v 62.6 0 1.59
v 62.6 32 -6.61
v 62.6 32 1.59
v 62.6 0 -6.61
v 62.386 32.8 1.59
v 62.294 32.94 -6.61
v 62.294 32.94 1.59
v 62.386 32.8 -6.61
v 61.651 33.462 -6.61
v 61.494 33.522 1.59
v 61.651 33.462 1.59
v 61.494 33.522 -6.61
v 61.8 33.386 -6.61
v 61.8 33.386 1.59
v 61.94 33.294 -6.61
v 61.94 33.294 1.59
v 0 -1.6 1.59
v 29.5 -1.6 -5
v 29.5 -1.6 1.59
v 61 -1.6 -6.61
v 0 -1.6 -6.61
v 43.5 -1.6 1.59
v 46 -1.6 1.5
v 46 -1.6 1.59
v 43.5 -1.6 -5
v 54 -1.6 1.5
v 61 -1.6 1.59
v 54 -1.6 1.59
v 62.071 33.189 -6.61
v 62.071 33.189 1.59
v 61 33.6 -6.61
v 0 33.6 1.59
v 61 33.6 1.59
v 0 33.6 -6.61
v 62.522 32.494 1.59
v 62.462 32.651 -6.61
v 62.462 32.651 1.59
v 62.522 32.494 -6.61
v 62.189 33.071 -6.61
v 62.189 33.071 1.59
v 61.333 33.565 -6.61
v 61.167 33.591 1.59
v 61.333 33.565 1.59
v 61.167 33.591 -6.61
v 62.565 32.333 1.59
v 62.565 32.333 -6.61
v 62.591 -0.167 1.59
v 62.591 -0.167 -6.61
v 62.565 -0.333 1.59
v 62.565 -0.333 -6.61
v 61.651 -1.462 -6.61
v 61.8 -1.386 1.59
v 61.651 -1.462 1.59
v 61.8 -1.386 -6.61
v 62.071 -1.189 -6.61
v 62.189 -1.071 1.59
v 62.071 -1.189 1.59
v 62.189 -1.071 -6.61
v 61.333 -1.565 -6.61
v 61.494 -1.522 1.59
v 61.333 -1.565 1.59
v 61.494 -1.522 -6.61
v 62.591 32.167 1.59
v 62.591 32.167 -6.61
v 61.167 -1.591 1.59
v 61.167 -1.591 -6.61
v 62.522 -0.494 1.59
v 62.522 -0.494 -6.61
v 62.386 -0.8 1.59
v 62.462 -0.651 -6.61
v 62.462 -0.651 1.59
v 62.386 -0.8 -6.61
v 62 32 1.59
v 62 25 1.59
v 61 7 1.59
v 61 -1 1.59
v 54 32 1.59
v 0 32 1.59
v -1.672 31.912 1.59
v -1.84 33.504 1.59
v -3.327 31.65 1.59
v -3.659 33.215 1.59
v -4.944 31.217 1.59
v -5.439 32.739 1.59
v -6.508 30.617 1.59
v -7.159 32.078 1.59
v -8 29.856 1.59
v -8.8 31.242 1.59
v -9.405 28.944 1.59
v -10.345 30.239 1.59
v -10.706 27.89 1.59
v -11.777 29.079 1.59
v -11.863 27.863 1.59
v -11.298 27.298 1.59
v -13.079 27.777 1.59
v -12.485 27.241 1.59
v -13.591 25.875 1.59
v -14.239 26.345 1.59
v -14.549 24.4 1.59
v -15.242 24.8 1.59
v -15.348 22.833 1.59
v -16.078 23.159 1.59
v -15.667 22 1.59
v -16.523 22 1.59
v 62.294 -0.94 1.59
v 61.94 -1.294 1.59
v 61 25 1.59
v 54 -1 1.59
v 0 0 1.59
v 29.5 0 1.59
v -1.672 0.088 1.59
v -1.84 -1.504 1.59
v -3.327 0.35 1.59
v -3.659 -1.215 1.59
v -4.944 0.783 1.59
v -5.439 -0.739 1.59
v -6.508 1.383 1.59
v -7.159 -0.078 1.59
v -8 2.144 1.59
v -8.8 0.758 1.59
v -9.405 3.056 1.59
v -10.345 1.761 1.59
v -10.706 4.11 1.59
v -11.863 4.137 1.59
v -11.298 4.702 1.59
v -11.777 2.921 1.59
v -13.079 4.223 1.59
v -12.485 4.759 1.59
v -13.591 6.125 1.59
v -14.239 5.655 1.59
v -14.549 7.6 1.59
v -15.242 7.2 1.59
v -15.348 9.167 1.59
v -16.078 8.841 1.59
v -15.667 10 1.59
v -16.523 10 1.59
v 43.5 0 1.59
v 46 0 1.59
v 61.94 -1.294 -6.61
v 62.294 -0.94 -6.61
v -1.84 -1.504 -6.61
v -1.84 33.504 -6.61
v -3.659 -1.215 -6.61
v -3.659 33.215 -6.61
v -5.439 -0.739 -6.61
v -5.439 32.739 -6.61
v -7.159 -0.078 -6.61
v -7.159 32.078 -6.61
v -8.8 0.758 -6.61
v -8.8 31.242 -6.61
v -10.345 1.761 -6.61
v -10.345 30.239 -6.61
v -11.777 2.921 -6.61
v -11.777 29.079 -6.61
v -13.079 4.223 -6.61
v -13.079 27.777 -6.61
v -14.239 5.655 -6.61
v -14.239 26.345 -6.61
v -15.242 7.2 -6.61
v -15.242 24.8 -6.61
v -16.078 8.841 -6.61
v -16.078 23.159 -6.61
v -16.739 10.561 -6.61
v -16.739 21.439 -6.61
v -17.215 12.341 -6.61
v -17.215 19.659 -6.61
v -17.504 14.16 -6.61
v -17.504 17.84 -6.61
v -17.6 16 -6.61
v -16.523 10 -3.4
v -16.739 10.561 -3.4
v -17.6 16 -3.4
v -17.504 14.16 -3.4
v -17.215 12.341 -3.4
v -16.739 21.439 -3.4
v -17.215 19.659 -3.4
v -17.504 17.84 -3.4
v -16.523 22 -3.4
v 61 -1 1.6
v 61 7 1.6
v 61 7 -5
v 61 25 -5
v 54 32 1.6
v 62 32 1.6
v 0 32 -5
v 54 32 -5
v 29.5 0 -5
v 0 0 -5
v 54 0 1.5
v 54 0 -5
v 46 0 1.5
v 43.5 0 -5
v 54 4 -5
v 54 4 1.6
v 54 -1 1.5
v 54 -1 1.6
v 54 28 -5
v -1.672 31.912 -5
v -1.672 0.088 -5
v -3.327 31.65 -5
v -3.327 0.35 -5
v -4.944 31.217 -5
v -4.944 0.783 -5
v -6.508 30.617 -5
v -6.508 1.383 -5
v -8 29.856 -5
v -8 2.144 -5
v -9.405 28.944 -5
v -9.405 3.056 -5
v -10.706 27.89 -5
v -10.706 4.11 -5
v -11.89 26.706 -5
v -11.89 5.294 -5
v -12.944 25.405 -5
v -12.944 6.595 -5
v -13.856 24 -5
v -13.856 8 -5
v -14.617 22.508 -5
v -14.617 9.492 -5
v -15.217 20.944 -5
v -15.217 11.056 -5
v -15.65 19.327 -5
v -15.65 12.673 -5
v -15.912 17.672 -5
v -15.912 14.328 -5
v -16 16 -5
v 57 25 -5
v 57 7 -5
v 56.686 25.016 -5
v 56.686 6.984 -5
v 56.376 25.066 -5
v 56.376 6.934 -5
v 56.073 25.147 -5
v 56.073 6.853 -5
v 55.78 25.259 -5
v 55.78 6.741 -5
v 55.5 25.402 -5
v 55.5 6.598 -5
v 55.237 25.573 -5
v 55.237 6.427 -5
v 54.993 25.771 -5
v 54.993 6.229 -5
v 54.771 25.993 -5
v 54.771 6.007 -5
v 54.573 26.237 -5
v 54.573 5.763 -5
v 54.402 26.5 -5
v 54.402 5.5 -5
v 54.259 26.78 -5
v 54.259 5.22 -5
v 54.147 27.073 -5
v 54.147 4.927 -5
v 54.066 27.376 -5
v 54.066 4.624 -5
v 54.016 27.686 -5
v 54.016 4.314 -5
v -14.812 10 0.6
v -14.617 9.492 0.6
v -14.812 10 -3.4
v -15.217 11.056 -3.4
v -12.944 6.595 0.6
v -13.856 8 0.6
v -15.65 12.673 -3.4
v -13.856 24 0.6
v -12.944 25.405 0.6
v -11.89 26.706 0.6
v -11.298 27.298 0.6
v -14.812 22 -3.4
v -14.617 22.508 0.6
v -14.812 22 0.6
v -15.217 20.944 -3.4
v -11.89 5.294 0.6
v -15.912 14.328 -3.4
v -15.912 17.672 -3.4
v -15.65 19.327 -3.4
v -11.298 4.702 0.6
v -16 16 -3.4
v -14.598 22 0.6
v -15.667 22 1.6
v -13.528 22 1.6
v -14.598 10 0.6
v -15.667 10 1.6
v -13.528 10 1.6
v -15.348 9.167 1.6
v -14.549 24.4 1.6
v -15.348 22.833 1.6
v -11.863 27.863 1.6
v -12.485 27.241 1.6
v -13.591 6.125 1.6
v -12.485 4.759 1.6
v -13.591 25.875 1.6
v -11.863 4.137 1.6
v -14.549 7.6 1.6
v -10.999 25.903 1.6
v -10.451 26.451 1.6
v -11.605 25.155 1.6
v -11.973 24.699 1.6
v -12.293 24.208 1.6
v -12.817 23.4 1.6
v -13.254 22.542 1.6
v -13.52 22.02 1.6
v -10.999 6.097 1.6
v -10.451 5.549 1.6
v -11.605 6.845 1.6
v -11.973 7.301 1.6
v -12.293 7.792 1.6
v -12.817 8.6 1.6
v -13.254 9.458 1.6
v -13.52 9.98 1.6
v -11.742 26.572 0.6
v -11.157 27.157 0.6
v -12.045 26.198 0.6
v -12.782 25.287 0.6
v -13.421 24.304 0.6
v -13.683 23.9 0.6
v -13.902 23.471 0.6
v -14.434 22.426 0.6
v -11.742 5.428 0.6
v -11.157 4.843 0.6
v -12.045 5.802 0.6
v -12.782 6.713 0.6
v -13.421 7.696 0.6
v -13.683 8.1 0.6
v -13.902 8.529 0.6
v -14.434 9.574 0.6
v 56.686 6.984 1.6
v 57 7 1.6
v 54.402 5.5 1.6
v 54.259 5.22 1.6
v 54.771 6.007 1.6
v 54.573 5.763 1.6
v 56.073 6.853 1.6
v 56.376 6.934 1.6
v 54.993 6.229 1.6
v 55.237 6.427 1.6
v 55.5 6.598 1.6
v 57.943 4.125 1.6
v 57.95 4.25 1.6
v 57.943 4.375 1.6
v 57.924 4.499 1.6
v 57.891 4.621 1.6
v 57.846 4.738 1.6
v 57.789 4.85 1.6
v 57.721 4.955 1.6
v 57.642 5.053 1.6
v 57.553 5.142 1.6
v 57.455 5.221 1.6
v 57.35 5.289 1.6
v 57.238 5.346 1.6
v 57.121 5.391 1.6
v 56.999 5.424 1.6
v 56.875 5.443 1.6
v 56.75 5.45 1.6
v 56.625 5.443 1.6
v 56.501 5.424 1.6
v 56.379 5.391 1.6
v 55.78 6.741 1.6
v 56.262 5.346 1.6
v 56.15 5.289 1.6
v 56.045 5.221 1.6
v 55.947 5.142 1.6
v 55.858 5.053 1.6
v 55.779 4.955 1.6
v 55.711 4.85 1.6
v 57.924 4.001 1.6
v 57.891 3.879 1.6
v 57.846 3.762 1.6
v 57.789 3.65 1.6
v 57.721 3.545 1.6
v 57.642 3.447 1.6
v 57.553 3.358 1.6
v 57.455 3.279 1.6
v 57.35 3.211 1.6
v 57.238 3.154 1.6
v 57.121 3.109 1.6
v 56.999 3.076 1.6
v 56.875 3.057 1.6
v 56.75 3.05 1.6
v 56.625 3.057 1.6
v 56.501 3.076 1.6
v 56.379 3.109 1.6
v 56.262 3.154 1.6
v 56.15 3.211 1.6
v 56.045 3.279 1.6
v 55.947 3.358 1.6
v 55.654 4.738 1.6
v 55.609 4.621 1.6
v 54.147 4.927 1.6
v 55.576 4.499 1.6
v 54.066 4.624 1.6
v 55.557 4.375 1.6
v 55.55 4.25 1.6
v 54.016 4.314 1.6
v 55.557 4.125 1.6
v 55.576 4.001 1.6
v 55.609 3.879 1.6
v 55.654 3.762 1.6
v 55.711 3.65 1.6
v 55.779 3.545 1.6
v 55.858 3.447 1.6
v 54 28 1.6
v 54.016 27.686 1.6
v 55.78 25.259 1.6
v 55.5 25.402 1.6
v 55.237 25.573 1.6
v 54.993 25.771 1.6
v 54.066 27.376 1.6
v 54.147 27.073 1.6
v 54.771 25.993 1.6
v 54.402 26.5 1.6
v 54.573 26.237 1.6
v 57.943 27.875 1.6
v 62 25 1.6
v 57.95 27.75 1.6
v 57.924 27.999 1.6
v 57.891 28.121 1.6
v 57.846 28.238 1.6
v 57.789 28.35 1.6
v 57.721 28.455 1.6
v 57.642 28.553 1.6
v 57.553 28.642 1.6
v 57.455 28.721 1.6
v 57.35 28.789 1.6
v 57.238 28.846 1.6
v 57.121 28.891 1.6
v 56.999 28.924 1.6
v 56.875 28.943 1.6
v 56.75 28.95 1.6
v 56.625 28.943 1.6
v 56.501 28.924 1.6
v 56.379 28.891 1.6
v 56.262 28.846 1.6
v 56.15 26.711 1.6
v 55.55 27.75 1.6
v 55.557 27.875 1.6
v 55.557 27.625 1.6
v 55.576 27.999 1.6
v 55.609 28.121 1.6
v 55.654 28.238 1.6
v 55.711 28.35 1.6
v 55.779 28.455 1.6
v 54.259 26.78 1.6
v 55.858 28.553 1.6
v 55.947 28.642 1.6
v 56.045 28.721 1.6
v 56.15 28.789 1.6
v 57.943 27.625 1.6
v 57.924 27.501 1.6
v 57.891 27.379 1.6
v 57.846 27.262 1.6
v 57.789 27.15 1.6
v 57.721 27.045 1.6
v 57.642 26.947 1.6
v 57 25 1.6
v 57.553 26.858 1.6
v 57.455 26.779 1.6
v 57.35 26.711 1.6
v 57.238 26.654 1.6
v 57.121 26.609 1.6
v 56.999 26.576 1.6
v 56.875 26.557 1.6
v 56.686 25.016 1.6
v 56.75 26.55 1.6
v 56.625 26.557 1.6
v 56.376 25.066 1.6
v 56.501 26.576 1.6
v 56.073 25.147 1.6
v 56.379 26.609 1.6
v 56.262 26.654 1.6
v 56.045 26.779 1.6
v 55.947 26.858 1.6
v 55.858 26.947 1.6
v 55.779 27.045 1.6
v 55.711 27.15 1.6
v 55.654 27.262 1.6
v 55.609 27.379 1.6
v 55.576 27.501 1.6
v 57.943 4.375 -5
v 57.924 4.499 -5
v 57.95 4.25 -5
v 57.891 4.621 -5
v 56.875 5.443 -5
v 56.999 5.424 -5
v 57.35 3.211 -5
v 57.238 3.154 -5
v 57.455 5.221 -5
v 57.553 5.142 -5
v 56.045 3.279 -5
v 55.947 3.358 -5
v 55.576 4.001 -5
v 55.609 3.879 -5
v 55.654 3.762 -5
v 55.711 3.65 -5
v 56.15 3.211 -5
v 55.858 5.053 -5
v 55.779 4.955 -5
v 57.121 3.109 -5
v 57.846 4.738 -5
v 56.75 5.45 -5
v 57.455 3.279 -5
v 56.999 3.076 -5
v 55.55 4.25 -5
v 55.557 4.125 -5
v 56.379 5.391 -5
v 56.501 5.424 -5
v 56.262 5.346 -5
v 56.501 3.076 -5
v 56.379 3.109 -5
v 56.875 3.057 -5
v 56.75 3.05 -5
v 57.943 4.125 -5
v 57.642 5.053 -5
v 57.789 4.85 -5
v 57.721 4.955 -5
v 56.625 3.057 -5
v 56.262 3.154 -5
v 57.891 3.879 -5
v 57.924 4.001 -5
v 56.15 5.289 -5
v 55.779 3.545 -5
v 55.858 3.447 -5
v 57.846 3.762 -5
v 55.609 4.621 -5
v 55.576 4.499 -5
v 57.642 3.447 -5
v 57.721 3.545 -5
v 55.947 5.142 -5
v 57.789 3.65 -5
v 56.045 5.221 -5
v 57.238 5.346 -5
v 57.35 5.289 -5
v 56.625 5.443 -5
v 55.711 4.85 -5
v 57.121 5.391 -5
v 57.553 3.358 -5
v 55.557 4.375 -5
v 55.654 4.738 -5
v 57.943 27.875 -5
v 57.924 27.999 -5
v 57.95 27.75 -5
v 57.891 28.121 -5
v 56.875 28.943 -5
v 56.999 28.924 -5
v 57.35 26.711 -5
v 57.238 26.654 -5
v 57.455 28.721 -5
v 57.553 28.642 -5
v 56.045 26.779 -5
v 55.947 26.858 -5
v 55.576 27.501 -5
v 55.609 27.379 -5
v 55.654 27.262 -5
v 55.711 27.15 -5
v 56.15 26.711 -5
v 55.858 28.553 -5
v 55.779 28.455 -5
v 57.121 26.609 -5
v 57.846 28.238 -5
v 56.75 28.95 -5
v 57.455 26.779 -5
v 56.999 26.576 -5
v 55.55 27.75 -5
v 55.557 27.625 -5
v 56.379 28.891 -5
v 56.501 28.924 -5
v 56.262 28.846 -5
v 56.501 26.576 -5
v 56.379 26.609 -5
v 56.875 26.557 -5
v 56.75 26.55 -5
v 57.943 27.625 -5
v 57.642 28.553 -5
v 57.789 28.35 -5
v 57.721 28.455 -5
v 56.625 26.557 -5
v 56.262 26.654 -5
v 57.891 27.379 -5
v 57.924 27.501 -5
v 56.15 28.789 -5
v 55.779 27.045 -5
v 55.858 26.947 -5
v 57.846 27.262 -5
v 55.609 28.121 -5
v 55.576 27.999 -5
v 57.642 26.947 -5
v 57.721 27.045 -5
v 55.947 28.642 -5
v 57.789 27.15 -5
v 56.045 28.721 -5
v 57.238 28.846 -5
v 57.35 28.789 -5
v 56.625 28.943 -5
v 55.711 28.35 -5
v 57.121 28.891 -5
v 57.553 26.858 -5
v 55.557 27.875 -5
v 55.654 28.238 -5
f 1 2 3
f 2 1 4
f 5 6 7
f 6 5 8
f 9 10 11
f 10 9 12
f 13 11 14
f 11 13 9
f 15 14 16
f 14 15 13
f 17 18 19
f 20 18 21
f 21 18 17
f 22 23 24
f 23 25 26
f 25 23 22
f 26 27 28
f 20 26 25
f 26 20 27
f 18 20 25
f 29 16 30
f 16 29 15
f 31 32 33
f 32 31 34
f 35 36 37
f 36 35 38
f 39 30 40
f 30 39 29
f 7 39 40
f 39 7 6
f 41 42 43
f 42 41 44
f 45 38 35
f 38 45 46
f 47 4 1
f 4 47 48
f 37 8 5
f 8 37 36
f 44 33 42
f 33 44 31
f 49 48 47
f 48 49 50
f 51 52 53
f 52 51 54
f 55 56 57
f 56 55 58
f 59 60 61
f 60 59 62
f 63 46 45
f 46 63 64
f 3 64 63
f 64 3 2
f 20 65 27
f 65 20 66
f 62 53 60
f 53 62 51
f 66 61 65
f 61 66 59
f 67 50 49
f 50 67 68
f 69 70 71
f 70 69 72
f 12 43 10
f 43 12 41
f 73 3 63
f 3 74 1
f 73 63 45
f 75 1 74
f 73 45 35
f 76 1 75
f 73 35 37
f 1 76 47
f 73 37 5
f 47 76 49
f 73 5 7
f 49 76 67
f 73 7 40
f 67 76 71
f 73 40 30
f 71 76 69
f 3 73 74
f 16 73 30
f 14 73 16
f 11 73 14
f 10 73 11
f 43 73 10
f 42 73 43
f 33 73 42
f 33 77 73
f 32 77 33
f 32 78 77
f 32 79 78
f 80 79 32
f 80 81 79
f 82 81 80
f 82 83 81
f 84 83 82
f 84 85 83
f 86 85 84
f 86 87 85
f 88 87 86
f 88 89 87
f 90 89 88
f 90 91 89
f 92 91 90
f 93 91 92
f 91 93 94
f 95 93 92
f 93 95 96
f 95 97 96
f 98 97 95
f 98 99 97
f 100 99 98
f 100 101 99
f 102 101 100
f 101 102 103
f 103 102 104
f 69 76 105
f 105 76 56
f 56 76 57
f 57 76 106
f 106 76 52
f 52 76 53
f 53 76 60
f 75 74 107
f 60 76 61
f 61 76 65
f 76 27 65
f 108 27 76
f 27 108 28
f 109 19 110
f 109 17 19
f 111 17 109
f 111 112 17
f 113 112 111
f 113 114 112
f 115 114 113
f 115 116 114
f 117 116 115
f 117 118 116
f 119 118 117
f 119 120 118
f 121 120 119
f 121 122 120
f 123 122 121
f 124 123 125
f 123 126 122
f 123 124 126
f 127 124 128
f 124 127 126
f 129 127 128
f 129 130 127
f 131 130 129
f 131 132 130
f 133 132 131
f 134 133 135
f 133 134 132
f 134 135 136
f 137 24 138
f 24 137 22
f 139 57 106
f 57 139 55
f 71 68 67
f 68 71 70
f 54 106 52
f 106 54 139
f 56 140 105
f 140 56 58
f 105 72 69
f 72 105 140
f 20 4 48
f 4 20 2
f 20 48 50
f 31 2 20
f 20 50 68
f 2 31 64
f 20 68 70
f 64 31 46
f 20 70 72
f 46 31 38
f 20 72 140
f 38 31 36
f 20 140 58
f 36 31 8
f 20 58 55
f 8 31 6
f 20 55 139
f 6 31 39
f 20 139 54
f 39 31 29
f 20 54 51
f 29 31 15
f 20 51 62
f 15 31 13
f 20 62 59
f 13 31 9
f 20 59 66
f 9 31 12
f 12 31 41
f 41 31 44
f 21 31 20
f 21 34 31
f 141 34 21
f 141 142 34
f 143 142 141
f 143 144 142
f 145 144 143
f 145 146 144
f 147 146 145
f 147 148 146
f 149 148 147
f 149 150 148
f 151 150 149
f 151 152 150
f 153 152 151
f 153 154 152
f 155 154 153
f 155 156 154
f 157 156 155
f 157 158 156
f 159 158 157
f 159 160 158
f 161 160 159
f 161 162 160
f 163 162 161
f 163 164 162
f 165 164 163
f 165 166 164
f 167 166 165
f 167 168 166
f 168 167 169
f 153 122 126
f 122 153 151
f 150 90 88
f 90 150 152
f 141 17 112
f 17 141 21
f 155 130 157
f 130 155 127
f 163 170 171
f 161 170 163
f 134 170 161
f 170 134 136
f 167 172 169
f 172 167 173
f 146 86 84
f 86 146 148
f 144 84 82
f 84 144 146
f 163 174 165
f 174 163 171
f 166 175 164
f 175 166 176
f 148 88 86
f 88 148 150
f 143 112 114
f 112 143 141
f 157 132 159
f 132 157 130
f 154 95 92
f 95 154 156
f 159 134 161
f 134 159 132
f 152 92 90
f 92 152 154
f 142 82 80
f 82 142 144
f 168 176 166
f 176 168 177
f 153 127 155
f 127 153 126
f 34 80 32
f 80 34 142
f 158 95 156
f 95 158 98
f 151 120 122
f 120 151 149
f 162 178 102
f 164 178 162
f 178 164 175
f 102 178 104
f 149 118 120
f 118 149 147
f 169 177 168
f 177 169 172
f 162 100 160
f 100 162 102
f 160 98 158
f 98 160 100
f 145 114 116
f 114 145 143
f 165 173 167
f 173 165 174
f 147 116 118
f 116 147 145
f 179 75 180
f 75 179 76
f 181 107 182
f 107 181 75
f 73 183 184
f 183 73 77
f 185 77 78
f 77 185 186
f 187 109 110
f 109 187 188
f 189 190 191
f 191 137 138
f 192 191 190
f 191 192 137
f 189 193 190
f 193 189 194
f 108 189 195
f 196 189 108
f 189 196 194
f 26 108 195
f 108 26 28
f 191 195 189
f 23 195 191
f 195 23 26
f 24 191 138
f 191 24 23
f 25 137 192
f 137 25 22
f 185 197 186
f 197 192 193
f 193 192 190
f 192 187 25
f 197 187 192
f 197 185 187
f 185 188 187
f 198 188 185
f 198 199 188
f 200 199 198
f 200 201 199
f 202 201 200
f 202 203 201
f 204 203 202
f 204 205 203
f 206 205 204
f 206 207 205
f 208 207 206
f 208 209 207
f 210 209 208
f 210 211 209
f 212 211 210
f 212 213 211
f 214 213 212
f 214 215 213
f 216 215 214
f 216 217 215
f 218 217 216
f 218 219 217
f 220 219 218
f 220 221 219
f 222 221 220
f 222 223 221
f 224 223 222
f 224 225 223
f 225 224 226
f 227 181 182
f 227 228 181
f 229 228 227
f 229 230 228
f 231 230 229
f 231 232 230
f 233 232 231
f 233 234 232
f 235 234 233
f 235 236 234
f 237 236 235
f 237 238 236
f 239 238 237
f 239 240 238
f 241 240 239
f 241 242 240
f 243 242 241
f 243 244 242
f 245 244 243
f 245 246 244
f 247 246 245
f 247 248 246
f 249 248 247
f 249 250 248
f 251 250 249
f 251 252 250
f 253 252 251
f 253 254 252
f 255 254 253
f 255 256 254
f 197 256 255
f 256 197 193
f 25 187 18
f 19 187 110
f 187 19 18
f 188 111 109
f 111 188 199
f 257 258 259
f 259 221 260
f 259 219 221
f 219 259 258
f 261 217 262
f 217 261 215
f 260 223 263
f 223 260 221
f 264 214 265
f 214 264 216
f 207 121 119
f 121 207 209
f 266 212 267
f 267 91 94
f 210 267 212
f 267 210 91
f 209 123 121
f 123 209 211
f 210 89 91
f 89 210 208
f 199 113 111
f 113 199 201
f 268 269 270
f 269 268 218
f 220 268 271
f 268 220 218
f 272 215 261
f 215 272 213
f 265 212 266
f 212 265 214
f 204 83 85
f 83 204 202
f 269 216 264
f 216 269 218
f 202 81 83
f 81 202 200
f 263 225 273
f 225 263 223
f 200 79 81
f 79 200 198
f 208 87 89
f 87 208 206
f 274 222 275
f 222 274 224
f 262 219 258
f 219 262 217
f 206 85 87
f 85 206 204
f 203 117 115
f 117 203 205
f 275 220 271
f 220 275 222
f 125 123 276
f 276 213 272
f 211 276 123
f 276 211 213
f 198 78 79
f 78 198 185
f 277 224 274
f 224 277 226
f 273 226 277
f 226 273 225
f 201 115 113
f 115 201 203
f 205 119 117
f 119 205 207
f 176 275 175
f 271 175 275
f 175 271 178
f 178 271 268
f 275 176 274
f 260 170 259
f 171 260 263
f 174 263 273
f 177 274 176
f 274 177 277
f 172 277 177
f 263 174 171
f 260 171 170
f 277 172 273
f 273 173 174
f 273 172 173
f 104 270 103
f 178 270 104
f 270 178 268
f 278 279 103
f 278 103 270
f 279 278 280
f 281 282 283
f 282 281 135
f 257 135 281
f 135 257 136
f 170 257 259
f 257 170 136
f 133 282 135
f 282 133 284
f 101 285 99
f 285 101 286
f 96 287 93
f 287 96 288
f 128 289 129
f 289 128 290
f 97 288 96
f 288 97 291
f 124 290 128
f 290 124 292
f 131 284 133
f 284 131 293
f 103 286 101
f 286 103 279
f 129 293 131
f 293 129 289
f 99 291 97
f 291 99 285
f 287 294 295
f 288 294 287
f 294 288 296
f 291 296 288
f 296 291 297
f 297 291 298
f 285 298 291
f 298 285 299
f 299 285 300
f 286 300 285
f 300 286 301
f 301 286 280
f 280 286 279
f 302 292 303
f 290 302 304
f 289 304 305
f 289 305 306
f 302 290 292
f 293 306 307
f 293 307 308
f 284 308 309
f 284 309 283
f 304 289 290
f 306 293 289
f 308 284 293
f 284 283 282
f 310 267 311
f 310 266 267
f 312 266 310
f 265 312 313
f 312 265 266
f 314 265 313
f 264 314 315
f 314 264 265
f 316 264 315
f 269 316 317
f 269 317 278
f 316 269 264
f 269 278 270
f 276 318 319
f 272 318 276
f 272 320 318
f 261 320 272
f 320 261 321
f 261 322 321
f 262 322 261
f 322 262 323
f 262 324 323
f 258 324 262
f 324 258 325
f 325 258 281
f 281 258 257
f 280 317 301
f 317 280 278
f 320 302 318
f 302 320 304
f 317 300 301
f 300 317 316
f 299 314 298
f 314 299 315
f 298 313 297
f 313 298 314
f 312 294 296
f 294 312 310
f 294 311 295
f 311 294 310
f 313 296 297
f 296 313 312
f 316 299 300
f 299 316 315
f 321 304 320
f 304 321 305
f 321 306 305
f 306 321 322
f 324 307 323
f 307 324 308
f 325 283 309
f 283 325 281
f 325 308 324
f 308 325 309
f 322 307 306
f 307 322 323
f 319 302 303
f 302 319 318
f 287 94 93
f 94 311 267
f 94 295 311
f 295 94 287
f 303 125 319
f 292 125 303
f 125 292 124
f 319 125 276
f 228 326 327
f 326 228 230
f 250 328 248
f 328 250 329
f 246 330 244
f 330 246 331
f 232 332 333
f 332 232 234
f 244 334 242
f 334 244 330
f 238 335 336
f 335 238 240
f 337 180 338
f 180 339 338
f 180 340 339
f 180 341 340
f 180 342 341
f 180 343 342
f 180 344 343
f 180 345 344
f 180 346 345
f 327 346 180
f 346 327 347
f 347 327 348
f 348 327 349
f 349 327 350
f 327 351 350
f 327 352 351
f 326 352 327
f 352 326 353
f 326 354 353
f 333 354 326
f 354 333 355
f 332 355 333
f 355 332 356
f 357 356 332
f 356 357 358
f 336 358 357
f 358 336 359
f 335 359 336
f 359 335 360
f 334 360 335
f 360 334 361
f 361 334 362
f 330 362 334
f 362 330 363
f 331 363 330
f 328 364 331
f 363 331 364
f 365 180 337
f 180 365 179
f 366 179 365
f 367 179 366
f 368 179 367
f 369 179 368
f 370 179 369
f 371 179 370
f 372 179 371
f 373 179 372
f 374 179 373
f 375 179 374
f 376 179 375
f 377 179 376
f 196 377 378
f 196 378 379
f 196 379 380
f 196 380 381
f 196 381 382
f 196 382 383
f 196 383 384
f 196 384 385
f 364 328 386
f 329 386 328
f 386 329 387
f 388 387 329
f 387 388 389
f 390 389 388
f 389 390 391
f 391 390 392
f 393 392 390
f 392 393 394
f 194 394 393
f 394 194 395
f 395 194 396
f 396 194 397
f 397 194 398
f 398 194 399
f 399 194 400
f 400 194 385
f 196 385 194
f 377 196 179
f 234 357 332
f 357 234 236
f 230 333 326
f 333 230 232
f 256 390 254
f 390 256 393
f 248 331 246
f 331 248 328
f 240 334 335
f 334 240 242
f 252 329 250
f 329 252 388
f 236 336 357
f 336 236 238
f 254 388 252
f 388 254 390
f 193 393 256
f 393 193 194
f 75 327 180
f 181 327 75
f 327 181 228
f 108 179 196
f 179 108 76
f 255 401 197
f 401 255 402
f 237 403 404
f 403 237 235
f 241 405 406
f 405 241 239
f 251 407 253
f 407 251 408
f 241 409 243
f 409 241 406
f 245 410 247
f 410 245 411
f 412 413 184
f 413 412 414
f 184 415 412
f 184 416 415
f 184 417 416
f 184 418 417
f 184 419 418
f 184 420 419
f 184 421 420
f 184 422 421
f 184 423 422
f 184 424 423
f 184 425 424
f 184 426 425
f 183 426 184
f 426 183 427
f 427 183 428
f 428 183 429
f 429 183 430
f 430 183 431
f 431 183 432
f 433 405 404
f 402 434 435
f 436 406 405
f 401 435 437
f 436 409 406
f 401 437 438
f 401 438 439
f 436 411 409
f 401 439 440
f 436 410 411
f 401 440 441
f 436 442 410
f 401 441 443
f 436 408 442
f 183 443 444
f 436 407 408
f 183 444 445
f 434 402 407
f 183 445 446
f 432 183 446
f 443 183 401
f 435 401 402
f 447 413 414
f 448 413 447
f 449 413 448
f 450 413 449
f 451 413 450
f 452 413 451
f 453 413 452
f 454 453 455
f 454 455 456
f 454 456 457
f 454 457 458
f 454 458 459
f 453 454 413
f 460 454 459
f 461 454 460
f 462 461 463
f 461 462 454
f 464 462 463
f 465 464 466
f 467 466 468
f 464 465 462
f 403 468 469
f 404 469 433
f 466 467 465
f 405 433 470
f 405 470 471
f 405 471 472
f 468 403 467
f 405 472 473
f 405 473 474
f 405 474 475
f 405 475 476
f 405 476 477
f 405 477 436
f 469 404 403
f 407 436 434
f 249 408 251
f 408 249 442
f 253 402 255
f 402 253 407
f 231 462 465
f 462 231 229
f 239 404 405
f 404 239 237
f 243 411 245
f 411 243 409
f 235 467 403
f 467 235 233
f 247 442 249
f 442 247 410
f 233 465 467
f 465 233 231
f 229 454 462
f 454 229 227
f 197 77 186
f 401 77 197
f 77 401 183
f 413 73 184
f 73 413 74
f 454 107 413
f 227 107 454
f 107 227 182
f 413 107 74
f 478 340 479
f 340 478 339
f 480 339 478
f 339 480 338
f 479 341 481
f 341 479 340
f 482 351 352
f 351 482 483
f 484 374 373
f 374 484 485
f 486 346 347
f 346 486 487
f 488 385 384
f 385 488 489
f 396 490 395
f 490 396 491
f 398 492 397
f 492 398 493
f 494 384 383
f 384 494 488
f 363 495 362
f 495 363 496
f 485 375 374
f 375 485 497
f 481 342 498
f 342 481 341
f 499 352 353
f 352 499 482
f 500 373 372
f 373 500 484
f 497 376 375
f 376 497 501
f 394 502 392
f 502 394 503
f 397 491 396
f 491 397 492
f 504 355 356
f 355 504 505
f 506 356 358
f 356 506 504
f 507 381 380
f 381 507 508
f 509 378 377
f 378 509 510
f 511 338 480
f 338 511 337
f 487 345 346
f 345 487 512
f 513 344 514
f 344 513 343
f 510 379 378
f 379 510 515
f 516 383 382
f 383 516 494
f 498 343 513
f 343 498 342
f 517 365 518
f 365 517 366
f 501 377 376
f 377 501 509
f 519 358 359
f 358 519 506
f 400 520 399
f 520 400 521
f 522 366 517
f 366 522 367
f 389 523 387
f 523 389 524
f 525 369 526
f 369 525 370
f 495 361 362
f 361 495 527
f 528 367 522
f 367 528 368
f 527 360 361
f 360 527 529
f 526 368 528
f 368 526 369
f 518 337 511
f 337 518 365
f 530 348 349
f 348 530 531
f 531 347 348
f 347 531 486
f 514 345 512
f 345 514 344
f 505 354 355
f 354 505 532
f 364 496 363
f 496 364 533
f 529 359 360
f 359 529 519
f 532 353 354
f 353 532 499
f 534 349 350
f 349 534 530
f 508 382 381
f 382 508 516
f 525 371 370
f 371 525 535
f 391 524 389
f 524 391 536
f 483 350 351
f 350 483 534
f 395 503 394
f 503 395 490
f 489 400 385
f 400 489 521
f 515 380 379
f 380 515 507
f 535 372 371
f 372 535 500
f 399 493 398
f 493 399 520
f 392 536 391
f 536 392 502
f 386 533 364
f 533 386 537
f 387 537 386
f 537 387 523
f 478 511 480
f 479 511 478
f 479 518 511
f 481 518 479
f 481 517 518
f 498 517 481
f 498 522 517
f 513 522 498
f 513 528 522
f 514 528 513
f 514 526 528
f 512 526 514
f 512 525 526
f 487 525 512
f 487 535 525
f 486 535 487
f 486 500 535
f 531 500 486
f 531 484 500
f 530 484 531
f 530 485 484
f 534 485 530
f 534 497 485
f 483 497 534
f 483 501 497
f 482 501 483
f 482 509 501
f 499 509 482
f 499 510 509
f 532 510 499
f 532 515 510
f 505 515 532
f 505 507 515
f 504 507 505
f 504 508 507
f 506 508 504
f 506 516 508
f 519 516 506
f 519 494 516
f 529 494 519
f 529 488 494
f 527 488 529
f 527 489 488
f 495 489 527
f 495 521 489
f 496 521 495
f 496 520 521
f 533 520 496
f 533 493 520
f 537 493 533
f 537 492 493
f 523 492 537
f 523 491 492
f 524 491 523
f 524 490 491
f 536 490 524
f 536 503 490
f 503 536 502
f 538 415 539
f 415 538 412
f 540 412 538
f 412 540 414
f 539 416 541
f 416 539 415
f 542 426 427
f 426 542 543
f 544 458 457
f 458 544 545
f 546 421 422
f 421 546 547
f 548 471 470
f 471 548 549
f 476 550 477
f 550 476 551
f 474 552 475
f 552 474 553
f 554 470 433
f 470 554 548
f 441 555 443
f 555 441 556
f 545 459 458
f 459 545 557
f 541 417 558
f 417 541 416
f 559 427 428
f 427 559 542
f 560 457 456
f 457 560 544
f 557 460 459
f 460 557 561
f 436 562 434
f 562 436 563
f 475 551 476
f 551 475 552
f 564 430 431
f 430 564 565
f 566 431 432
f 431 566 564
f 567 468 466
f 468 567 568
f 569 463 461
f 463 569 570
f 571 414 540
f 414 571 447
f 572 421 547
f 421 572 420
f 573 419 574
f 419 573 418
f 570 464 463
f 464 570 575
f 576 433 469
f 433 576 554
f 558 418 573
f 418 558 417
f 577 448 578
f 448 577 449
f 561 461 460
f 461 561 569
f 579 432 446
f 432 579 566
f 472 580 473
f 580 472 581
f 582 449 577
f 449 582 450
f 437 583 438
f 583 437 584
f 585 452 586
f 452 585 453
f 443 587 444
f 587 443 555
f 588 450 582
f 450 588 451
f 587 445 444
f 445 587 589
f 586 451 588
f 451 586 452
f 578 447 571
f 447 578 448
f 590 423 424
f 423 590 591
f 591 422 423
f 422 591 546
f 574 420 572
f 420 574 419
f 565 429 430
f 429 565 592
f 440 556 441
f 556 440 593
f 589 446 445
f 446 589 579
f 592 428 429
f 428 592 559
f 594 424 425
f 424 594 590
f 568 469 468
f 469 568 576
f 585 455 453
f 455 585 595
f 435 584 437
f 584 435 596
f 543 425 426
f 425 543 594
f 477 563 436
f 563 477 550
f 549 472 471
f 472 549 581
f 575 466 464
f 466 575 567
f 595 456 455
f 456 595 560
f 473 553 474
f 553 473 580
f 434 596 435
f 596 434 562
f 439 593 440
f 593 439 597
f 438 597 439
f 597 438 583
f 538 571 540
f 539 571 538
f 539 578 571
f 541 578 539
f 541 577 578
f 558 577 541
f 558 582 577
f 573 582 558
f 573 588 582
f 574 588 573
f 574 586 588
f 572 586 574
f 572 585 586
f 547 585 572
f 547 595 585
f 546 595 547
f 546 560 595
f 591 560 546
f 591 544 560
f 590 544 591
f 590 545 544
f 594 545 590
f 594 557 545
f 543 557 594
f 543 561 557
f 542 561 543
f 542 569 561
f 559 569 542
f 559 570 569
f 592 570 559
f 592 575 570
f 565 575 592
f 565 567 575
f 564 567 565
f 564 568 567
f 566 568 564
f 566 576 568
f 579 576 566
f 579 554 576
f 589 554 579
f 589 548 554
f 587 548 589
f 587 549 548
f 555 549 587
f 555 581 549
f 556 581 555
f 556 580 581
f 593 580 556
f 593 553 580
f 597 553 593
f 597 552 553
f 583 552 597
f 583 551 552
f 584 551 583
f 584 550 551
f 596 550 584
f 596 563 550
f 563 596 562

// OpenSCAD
$fn = 60;

wall             =  1.6;  // mm
clip_stem_width  =  1.6;  // mm

pi0_width        = 32;    // mm, including usb stubs
pi0_length       = 61;    // mm, including camera protector
pi0_height       = 12;    // mm, including headers
pi0_board        =  1.5;  // mm
pi0_board_offset =  2;    // mm
pi0_srew_delta   =  3;    // mm
pi0_solder       =  1.6;  // mm

pi0_plug_length  =  8;    // mm
pi0_plug_width   =  1.5;  // mm
pi0_plug_height  =  3;    // mm
pi0_plug_1_delta =  7;    // mm
pi0_plug_2_delta =  5.5;  // mm

plug_length      = 14;    // mm
plug_width       =  5;    // mm
plug_height      =  8.5;  // mm
plug_xtra_height =  5;    // mm

dongle_offset    =  5;    // mm
dongle_solder    =  1.6;  // mm

usb_width        = 12;    // mm
usb_height       =  5;    // mm
usb_front_offset = 24;    // mm

screw_thread     =  2.5;  // mm
screw_head       =  5;    // mm


//  calculated globals
plug1_x_offset     = pi0_length - (pi0_plug_1_delta + pi0_plug_length);
plug2_x_offset     = plug1_x_offset - (pi0_plug_2_delta + pi0_plug_length);
connector_x_offset = plug2_x_offset - (plug_length - pi0_plug_length) / 2;
dongle_length      = connector_x_offset + plug_length;
dongle_height      = dongle_offset + dongle_solder;
dongle_z_offset    = (dongle_height - pi0_solder);
usb_z_offset       = dongle_z_offset - dongle_solder;
usb_y_offset       = (pi0_width - usb_width) / 2;

case_width         = pi0_width + 2 * wall;
case_base_length   = pi0_length + wall;

bottom_case_height = dongle_height + wall;
top_case_height    = pi0_height - dongle_solder + wall;

module pi0() {
    cube([pi0_length, pi0_width, pi0_height]);

    plug_z_offset = pi0_board + pi0_board_offset;

    translate([plug1_x_offset, -pi0_plug_width - 1, plug_z_offset - 2]) {
        cube([pi0_plug_length, pi0_plug_width + 2, pi0_plug_height + 2]);
    }
    translate([plug2_x_offset, - pi0_plug_width, plug_z_offset]) {
        cube([pi0_plug_length, pi0_plug_width +1, pi0_plug_height]);
    }
}


module dongle() {
    // connector to pi0
    translate([connector_x_offset, -plug_width, -dongle_z_offset])
        cube([plug_length, plug_width + 1, dongle_height+ plug_xtra_height]);

    // base board
    translate([0, 0, -dongle_z_offset])
        cube([dongle_length, pi0_width, dongle_height]);
    translate([0, pi0_width / 2, -dongle_z_offset])
        cylinder(dongle_height, d=pi0_width);

    // usb connector
    translate([-usb_front_offset, usb_y_offset, -usb_z_offset])
        cube([usb_front_offset, usb_width, usb_height]);
}

module pi0_with_dongle() {
    pi0();
    dongle();
}

module pi0_cut() {
    pi0();
    dongle();
    translate([0, 0, -dongle_z_offset])
        cube([pi0_length, pi0_width, dongle_height]);
    translate([0, pi0_width / 2, -dongle_z_offset])
        cylinder(dongle_offset + pi0_height, d=pi0_width);
}


module base_case(height) {
    translate([0, -wall, 0]) {
        hull() {
            cube([case_base_length - wall, case_width, height]);
            translate([case_base_length - wall, wall, 0])
                cylinder(height, r = wall);
            translate([case_base_length - wall, case_width - wall, 0])
               cylinder(height, r = wall);
        }
        translate([0, case_width / 2, 0])
            cylinder(height, d=case_width);
    }
}


module screw_raiser(height) {
    translate([-4, 4, 0]) {
        cylinder(height, d=6);
        translate([0, -5, 0])
            cube([4, 6 + 2, height]);
        translate([-3, -5, 0])
            cube([6 + 1, 5, height]);
    }
}


module bottom_clips() {
    radius_lower = (pi0_width + wall) / 2;
    radius_upper = radius_lower - 3;
    difference() {
        cylinder(1, radius_lower, radius_lower);
        translate([0, 0, -1])
            cylinder(3, radius_lower, radius_upper);
        translate([-20, -usb_width/2, -20])
            cube([40, usb_width, 40]);
        rotate([0, 0, 45])
            translate([0, -20, -20])
                cube([40, 40, 40]);
        rotate([0, 0, -45])
            translate([0, -20, -20])
                cube([40, 40, 40]);
    }
}


module bottom_base_case() {
    bottom_case_offset = dongle_z_offset + wall;
    difference() {
        translate([0, 0, -bottom_case_offset - 0.01])
            base_case(bottom_case_height);
        pi0_cut();
    }

    translate([0, pi0_width / 2, -1 + dongle_solder])
        bottom_clips();

    translate([case_base_length - wall, 0, -bottom_case_offset])
        screw_raiser(bottom_case_height);
    translate([case_base_length - wall, pi0_width, -bottom_case_offset])
        rotate([0, 0, 90])
            screw_raiser(bottom_case_height);

}


module bottom_case() {
    difference() {
        bottom_base_case();
        translate([case_base_length - wall - 4.25, 4.25, -dongle_z_offset])
            cylinder(bottom_case_height, d=screw_thread - 0.1);
        translate([case_base_length - wall - 4.25, pi0_width - 4.25, -dongle_z_offset])
            cylinder(bottom_case_height, d=screw_thread - 0.1);
    }
}


module top_base_case() {
    difference() {
        translate([0, 0, dongle_solder])
            base_case(top_case_height);
        pi0_cut();

    }

    // screw raiser
    screw_height = top_case_height - pi0_board;
    screw_z_offset = dongle_solder + pi0_board;
    translate([case_base_length - wall, 0, screw_z_offset])
        screw_raiser(screw_height);
    translate([case_base_length - wall, pi0_width, screw_z_offset])
        rotate([0, 0, 90])
            screw_raiser(screw_height);
}

module top_clips() {
    difference() {
        translate([0, 0, 0.2])
            cylinder(top_case_height + 0.2, d=pi0_width + wall - 1);
        translate([0, 0, -2])
            cylinder(top_case_height + 4, d=pi0_width - 4);
        translate([-20, (-usb_width - 1)/2, -20])
            cube([40, usb_width + 1, 40]);
        rotate([0, 0, 46])
            translate([0, -20, -20])
                cube([40, 40, 40]);
        rotate([0, 0, -46])
            translate([0, -20, -20])
                cube([40, 40, 40]);
        bottom_clips();
    }
}


module top_case() {
    screw_z_offset = dongle_solder + pi0_board;
    head_z_offset = top_case_height + dongle_solder - 9.5;
    difference() {
        top_base_case();

        // screw hole with head sunk
        translate([case_base_length - wall - 4.25, 4.25, dongle_solder])
            cylinder(top_case_height, d=screw_thread + 0.2);
        translate([case_base_length - wall - 4.25, 4.25, head_z_offset])
            cylinder(10, d=screw_head);

        // screw hole with head sunk
        translate([case_base_length - wall - 4.25, pi0_width - 4.25, dongle_solder])
            cylinder(top_case_height, d=screw_thread + 0.2);
        translate([case_base_length - wall - 4.25, pi0_width - 4.25, head_z_offset])
            cylinder(10, d=screw_head);
    }
    translate([0, pi0_width / 2, dongle_solder - 1])
        top_clips();

}



bottom_case();
//top_case();
